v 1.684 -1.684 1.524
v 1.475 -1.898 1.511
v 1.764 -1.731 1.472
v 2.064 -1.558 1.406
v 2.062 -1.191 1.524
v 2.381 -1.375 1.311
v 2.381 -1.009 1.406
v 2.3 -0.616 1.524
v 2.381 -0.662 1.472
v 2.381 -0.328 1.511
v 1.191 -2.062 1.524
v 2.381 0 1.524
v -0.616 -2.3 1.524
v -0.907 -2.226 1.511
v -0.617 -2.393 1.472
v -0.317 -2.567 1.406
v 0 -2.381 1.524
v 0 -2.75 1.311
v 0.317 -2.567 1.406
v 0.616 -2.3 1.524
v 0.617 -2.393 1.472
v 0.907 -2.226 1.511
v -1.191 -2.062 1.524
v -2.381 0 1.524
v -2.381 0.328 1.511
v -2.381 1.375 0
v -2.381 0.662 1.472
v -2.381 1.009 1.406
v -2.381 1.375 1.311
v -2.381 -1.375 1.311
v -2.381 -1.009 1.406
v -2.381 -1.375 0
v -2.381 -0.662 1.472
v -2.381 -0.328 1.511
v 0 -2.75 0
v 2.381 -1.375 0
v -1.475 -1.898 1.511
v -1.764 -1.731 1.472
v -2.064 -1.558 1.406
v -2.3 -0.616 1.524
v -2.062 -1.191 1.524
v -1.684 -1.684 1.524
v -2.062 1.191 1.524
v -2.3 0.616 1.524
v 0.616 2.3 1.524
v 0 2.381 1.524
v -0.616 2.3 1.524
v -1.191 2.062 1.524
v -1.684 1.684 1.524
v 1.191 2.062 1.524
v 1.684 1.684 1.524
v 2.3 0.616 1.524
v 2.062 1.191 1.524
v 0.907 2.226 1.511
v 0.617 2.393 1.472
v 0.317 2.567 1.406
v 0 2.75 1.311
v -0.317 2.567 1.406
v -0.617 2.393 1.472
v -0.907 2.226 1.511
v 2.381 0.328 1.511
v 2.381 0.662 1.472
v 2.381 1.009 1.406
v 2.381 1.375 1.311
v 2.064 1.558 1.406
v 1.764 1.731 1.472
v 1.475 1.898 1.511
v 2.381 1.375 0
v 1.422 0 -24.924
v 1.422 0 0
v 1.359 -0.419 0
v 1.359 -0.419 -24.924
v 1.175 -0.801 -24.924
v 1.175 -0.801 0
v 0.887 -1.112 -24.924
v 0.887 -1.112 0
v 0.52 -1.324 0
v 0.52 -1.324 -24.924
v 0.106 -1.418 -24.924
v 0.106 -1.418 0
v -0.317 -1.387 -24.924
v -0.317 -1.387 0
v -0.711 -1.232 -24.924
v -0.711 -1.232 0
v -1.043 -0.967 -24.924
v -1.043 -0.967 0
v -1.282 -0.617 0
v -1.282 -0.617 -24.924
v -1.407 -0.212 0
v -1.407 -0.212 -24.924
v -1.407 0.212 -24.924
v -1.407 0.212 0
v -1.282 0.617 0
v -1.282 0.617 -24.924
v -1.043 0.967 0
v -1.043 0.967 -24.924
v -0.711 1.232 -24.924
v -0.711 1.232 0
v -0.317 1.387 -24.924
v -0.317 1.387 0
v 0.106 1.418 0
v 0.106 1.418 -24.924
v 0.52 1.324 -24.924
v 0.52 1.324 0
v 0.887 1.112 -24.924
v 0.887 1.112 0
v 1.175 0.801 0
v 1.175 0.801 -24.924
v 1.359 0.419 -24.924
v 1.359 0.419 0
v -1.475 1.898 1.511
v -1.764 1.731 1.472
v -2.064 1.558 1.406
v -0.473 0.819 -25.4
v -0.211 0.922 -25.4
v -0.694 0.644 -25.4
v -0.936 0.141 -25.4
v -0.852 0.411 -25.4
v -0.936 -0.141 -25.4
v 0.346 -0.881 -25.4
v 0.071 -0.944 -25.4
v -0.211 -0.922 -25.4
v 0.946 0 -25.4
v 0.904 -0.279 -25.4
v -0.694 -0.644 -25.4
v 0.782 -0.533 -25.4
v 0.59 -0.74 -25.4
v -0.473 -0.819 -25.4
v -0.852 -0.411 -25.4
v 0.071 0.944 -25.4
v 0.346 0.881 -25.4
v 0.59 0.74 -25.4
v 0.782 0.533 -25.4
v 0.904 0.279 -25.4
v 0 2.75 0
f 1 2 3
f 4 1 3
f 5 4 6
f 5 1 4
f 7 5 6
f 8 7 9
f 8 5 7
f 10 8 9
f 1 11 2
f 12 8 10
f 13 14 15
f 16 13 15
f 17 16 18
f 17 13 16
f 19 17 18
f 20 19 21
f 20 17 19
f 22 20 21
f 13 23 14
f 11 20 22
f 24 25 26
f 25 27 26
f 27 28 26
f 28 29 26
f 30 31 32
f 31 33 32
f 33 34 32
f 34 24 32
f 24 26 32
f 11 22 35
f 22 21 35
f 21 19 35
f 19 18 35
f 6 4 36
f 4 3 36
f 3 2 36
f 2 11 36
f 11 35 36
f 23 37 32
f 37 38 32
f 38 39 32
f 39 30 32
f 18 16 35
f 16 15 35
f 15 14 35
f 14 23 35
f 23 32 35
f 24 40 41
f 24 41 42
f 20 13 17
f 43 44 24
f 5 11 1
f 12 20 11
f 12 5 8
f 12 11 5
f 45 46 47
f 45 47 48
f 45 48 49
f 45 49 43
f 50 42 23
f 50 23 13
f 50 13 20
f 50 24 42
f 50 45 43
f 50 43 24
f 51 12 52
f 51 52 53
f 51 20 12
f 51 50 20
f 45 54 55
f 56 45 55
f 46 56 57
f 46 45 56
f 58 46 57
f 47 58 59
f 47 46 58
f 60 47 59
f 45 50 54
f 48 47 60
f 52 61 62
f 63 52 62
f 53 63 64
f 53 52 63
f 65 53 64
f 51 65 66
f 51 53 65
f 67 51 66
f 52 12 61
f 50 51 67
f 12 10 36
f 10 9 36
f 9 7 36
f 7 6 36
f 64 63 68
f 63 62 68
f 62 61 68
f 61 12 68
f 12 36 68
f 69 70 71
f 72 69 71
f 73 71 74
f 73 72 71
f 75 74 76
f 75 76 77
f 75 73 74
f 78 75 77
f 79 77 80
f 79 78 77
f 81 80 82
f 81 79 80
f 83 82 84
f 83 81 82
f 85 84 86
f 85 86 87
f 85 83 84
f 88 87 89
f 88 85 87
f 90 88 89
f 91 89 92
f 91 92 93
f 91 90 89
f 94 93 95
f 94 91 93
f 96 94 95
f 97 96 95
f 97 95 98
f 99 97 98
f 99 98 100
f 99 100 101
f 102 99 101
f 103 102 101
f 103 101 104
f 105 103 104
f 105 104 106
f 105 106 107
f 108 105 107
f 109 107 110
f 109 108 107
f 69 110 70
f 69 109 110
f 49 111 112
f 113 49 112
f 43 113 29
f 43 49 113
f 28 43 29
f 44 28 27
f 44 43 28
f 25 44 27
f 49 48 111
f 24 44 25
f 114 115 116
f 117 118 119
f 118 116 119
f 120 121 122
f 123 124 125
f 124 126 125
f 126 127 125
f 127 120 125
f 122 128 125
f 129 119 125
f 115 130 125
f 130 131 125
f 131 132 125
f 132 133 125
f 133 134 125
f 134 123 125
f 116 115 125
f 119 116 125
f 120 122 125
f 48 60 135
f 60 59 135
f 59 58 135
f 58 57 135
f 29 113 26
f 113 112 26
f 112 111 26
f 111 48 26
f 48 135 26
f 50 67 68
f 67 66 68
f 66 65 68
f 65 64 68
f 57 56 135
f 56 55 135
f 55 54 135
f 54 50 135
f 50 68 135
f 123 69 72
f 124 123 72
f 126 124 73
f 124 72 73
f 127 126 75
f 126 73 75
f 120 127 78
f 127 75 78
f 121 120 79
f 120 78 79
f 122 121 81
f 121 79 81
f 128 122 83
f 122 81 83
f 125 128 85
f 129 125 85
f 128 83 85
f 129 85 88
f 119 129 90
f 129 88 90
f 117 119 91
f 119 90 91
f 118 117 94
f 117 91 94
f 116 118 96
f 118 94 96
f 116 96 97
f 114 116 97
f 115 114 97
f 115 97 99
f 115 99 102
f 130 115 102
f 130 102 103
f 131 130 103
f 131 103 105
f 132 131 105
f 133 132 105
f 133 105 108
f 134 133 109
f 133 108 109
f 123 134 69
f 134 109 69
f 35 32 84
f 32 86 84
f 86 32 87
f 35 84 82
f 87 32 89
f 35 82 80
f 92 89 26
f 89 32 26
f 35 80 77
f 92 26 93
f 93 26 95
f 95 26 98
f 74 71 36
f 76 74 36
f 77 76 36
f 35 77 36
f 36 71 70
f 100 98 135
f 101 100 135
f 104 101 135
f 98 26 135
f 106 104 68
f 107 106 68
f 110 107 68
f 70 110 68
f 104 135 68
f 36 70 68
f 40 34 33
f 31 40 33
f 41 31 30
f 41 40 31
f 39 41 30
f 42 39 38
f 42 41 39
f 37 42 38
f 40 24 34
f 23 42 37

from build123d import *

# Parameters (mm, degrees)
EXTRUDE3_DEPTH     = 1.524
SKETCH4_W          = 25.4
SKETCH4_H          = 1.4224
CHAMFER2_SIZE      = 0.47625
SKETCH26_R         = 0.5461
EXTRUDE12_DEPTH    = 1.524
SKETCH30_OUTSIDE_W = 21.138
SKETCH30_OUTSIDE_H = 21.876
SKETCH30_OUTSIDE_R = 2.38125
EXTRUDE13_DEPTH    = 2.54
EXTRUDE13_DRAFT    = -60


with BuildPart() as part:
    # Sketch1 → Extrude3 (new body)
    with BuildSketch(Plane.XY):
        Polygon((-2.38125, -1.374815329), (0, -2.749630657), (2.38125, -1.374815329), (2.38125, 1.374815329), (0, 2.749630657), (-2.38125, 1.374815329), align=None)
    extrude(amount=EXTRUDE3_DEPTH)



with BuildPart() as body_2:
    # Sketch4 → Revolve1 (revolve)
    with BuildSketch(Plane(origin=(0, 0, 0), x_dir=(0, 0, -1), z_dir=(1, 0, 0)), mode=Mode.PRIVATE) as revolve1_sk:
        with Locations((12.7, 0.7112)):
            Rectangle(SKETCH4_W, SKETCH4_H)
    revolve(revolve1_sk.sketch.rotate(Axis((0, 0, 0), (0, 0, -1)), 90), axis=Axis((0, 0, 0), (0, 0, -1)))

    # Chamfer2
    chamfer2_edges = [body_2.edges().sort_by_distance(p)[0] for p in [
        (-1.4224, 0, -25.4),
    ]]
    chamfer(chamfer2_edges, length=CHAMFER2_SIZE)


with BuildPart() as part_1:
    add(part.part)

    add(body_2.part)  # Extrude12 merges body 2
    # Sketch26 → Extrude12 (add)
    with BuildSketch(Plane.XY):
        Circle(SKETCH26_R)
    extrude(amount=EXTRUDE12_DEPTH)


with BuildPart() as extrude13_tool:
    # Sketch30 outside → Extrude13 (with draft: the straight prism first)
    with BuildSketch(Plane.XY.offset(1.524)):
        Rectangle(SKETCH30_OUTSIDE_W, SKETCH30_OUTSIDE_H)
        Circle(SKETCH30_OUTSIDE_R, mode=Mode.SUBTRACT)
    extrude(amount=-EXTRUDE13_DEPTH)
    # Extrude13: the draft: its side faces are tilted about the plane it starts from
    extrude13_sides = [extrude13_tool.faces().sort_by_distance(p)[0] for p in [
        (0, -10.938, 0.254),
        (10.569, 0, 0.254),
        (0, 10.938, 0.254),
        (-10.569, 0, 0.254),
        (-2.38125, 0, 0.254),
    ]]
    draft(extrude13_sides, Plane.XY.offset(1.524), EXTRUDE13_DRAFT)


with BuildPart() as part_2:
    add(part_1.part)

    # Extrude13: cut by extrude13_tool
    add(extrude13_tool.part, mode=Mode.SUBTRACT)


solid = part_2.part
